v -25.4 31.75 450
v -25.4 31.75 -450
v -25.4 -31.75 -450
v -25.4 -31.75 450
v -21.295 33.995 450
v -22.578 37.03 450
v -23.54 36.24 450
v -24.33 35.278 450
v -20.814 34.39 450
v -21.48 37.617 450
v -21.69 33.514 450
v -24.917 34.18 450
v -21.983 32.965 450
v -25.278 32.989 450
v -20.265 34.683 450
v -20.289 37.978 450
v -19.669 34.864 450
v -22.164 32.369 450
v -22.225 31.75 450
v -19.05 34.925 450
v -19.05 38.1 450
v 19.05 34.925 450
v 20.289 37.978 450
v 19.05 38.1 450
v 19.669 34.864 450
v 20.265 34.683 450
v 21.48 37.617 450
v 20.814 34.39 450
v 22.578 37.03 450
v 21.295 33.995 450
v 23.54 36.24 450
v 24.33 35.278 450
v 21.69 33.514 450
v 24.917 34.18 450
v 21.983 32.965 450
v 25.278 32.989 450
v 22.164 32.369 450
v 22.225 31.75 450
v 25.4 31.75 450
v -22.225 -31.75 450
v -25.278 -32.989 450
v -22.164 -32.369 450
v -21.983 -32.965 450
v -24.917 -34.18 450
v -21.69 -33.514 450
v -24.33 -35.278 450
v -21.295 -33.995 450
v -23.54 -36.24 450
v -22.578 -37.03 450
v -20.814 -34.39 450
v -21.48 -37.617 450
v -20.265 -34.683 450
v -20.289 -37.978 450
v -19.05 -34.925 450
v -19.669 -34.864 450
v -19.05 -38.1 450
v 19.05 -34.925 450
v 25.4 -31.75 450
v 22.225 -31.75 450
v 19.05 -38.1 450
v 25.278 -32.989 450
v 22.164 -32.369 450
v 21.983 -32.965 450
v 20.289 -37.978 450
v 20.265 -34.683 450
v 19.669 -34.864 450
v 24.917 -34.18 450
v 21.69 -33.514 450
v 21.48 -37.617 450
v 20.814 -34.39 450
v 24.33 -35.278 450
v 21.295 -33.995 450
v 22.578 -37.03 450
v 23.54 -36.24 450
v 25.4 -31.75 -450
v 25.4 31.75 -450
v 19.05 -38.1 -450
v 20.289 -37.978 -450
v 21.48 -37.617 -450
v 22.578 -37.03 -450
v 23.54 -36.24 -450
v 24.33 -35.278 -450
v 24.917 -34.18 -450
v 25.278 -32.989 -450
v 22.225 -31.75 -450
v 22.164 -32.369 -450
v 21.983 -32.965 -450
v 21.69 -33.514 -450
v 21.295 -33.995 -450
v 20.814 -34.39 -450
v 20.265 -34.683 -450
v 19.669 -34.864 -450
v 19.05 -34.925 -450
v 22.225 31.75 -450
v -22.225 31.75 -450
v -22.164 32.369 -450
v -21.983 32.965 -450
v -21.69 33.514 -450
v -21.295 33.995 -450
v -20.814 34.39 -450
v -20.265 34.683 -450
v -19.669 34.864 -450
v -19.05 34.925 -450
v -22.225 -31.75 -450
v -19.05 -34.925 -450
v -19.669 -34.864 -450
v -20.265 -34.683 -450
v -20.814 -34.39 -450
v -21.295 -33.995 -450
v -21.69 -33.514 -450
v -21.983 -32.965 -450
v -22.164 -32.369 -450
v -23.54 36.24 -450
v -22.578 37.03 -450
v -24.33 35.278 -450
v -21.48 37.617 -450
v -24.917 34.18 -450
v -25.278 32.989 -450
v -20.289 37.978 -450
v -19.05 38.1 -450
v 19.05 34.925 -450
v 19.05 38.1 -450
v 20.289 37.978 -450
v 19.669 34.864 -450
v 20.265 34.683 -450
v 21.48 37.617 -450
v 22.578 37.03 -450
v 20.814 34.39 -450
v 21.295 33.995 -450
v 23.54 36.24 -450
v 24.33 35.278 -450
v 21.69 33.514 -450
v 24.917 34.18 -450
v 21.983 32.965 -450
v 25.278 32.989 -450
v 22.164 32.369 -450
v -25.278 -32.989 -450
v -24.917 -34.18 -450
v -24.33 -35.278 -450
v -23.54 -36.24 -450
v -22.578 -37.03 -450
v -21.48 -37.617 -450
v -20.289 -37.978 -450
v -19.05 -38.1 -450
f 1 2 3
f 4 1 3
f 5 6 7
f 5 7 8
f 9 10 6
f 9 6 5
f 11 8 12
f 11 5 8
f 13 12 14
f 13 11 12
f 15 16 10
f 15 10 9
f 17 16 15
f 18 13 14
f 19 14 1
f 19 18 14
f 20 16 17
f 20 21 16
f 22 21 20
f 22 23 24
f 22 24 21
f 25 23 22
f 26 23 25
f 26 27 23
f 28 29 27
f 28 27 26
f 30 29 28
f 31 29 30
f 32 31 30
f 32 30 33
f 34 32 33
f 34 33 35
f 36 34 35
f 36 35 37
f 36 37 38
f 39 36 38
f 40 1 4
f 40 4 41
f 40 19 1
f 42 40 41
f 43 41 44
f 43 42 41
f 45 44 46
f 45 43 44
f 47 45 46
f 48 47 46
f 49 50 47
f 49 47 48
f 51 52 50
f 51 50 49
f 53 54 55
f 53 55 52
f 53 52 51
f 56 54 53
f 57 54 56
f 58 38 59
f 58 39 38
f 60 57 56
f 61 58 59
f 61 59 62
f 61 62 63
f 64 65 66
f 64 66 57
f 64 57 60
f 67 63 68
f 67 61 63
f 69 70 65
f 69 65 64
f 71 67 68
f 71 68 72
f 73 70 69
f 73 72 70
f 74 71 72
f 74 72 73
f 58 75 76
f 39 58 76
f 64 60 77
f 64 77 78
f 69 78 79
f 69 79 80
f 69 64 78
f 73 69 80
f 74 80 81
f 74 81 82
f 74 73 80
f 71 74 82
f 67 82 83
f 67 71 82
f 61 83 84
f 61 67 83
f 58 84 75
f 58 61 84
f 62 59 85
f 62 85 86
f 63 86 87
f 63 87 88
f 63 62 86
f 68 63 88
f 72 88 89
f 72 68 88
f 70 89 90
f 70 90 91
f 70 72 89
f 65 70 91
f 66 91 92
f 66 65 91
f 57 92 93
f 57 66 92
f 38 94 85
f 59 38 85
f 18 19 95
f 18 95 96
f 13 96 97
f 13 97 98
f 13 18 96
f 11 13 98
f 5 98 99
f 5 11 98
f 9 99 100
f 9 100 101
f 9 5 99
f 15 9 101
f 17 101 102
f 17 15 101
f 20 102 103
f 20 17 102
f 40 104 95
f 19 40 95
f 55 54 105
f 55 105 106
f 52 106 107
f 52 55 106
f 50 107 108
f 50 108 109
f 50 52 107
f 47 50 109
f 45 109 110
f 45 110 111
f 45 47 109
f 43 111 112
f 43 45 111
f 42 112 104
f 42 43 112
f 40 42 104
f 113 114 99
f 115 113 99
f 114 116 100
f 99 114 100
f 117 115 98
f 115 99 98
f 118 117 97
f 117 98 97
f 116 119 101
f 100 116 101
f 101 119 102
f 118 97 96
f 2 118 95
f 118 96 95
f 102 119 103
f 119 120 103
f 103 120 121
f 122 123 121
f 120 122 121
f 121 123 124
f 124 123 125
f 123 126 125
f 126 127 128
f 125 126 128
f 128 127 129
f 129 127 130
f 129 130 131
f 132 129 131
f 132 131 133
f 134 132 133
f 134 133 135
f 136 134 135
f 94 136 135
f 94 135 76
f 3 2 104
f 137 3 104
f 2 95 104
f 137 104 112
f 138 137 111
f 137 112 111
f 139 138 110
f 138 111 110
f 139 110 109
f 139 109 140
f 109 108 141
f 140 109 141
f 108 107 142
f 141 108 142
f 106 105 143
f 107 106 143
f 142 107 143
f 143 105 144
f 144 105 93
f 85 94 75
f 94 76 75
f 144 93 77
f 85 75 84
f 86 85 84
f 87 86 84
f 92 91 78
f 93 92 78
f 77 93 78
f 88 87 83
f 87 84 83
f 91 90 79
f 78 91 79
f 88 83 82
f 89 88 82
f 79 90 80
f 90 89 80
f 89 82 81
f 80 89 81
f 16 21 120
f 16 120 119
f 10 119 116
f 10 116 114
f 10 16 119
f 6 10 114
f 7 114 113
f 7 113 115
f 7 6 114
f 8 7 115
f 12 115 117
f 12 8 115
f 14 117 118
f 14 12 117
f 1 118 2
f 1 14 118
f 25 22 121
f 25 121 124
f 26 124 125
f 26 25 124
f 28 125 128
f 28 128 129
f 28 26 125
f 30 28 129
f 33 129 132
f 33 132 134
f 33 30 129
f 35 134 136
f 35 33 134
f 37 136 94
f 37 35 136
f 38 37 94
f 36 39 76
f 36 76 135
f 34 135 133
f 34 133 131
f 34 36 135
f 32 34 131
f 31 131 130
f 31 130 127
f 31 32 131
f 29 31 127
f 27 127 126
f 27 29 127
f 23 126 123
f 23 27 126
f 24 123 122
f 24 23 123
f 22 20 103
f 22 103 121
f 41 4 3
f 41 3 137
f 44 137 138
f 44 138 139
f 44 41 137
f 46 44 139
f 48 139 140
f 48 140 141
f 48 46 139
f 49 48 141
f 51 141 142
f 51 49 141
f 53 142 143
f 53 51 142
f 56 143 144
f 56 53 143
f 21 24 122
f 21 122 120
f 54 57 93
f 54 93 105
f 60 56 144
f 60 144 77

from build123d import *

# Parameters (mm, degrees)
CNC_3X2X0_125_1_DEPTH = 900


with BuildPart() as part:
    # Sketch11 → Cnc 3X2X0.125(1) (new body)
    with BuildSketch(Plane.YX.offset(-450)):
        with BuildLine():
            Line((31.75, -25.4), (-31.75, -25.4))
            ThreePointArc((-31.75, -25.4), (-36.240128061, -23.540128061), (-38.1, -19.05))
            Line((-38.1, -19.05), (-38.1, 19.05))
            ThreePointArc((-38.1, 19.05), (-36.240128061, 23.540128061), (-31.75, 25.4))
            Line((-31.75, 25.4), (31.75, 25.4))
            ThreePointArc((31.75, 25.4), (36.240128061, 23.540128061), (38.1, 19.05))
            Line((38.1, 19.05), (38.1, -19.05))
            ThreePointArc((38.1, -19.05), (36.240128061, -23.540128061), (31.75, -25.4))
        make_face()
        with BuildLine():
            Line((31.75, 22.225), (-31.75, 22.225))
            ThreePointArc((-31.75, 22.225), (-33.99506403, 21.29506403), (-34.925, 19.05))
            Line((-34.925, 19.05), (-34.925, -19.05))
            ThreePointArc((-34.925, -19.05), (-33.99506403, -21.29506403), (-31.75, -22.225))
            Line((-31.75, -22.225), (31.75, -22.225))
            ThreePointArc((31.75, -22.225), (33.99506403, -21.29506403), (34.925, -19.05))
            Line((34.925, -19.05), (34.925, 19.05))
            ThreePointArc((34.925, 19.05), (33.99506403, 21.29506403), (31.75, 22.225))
        make_face(mode=Mode.SUBTRACT)
    extrude(amount=CNC_3X2X0_125_1_DEPTH)


solid = part.part
